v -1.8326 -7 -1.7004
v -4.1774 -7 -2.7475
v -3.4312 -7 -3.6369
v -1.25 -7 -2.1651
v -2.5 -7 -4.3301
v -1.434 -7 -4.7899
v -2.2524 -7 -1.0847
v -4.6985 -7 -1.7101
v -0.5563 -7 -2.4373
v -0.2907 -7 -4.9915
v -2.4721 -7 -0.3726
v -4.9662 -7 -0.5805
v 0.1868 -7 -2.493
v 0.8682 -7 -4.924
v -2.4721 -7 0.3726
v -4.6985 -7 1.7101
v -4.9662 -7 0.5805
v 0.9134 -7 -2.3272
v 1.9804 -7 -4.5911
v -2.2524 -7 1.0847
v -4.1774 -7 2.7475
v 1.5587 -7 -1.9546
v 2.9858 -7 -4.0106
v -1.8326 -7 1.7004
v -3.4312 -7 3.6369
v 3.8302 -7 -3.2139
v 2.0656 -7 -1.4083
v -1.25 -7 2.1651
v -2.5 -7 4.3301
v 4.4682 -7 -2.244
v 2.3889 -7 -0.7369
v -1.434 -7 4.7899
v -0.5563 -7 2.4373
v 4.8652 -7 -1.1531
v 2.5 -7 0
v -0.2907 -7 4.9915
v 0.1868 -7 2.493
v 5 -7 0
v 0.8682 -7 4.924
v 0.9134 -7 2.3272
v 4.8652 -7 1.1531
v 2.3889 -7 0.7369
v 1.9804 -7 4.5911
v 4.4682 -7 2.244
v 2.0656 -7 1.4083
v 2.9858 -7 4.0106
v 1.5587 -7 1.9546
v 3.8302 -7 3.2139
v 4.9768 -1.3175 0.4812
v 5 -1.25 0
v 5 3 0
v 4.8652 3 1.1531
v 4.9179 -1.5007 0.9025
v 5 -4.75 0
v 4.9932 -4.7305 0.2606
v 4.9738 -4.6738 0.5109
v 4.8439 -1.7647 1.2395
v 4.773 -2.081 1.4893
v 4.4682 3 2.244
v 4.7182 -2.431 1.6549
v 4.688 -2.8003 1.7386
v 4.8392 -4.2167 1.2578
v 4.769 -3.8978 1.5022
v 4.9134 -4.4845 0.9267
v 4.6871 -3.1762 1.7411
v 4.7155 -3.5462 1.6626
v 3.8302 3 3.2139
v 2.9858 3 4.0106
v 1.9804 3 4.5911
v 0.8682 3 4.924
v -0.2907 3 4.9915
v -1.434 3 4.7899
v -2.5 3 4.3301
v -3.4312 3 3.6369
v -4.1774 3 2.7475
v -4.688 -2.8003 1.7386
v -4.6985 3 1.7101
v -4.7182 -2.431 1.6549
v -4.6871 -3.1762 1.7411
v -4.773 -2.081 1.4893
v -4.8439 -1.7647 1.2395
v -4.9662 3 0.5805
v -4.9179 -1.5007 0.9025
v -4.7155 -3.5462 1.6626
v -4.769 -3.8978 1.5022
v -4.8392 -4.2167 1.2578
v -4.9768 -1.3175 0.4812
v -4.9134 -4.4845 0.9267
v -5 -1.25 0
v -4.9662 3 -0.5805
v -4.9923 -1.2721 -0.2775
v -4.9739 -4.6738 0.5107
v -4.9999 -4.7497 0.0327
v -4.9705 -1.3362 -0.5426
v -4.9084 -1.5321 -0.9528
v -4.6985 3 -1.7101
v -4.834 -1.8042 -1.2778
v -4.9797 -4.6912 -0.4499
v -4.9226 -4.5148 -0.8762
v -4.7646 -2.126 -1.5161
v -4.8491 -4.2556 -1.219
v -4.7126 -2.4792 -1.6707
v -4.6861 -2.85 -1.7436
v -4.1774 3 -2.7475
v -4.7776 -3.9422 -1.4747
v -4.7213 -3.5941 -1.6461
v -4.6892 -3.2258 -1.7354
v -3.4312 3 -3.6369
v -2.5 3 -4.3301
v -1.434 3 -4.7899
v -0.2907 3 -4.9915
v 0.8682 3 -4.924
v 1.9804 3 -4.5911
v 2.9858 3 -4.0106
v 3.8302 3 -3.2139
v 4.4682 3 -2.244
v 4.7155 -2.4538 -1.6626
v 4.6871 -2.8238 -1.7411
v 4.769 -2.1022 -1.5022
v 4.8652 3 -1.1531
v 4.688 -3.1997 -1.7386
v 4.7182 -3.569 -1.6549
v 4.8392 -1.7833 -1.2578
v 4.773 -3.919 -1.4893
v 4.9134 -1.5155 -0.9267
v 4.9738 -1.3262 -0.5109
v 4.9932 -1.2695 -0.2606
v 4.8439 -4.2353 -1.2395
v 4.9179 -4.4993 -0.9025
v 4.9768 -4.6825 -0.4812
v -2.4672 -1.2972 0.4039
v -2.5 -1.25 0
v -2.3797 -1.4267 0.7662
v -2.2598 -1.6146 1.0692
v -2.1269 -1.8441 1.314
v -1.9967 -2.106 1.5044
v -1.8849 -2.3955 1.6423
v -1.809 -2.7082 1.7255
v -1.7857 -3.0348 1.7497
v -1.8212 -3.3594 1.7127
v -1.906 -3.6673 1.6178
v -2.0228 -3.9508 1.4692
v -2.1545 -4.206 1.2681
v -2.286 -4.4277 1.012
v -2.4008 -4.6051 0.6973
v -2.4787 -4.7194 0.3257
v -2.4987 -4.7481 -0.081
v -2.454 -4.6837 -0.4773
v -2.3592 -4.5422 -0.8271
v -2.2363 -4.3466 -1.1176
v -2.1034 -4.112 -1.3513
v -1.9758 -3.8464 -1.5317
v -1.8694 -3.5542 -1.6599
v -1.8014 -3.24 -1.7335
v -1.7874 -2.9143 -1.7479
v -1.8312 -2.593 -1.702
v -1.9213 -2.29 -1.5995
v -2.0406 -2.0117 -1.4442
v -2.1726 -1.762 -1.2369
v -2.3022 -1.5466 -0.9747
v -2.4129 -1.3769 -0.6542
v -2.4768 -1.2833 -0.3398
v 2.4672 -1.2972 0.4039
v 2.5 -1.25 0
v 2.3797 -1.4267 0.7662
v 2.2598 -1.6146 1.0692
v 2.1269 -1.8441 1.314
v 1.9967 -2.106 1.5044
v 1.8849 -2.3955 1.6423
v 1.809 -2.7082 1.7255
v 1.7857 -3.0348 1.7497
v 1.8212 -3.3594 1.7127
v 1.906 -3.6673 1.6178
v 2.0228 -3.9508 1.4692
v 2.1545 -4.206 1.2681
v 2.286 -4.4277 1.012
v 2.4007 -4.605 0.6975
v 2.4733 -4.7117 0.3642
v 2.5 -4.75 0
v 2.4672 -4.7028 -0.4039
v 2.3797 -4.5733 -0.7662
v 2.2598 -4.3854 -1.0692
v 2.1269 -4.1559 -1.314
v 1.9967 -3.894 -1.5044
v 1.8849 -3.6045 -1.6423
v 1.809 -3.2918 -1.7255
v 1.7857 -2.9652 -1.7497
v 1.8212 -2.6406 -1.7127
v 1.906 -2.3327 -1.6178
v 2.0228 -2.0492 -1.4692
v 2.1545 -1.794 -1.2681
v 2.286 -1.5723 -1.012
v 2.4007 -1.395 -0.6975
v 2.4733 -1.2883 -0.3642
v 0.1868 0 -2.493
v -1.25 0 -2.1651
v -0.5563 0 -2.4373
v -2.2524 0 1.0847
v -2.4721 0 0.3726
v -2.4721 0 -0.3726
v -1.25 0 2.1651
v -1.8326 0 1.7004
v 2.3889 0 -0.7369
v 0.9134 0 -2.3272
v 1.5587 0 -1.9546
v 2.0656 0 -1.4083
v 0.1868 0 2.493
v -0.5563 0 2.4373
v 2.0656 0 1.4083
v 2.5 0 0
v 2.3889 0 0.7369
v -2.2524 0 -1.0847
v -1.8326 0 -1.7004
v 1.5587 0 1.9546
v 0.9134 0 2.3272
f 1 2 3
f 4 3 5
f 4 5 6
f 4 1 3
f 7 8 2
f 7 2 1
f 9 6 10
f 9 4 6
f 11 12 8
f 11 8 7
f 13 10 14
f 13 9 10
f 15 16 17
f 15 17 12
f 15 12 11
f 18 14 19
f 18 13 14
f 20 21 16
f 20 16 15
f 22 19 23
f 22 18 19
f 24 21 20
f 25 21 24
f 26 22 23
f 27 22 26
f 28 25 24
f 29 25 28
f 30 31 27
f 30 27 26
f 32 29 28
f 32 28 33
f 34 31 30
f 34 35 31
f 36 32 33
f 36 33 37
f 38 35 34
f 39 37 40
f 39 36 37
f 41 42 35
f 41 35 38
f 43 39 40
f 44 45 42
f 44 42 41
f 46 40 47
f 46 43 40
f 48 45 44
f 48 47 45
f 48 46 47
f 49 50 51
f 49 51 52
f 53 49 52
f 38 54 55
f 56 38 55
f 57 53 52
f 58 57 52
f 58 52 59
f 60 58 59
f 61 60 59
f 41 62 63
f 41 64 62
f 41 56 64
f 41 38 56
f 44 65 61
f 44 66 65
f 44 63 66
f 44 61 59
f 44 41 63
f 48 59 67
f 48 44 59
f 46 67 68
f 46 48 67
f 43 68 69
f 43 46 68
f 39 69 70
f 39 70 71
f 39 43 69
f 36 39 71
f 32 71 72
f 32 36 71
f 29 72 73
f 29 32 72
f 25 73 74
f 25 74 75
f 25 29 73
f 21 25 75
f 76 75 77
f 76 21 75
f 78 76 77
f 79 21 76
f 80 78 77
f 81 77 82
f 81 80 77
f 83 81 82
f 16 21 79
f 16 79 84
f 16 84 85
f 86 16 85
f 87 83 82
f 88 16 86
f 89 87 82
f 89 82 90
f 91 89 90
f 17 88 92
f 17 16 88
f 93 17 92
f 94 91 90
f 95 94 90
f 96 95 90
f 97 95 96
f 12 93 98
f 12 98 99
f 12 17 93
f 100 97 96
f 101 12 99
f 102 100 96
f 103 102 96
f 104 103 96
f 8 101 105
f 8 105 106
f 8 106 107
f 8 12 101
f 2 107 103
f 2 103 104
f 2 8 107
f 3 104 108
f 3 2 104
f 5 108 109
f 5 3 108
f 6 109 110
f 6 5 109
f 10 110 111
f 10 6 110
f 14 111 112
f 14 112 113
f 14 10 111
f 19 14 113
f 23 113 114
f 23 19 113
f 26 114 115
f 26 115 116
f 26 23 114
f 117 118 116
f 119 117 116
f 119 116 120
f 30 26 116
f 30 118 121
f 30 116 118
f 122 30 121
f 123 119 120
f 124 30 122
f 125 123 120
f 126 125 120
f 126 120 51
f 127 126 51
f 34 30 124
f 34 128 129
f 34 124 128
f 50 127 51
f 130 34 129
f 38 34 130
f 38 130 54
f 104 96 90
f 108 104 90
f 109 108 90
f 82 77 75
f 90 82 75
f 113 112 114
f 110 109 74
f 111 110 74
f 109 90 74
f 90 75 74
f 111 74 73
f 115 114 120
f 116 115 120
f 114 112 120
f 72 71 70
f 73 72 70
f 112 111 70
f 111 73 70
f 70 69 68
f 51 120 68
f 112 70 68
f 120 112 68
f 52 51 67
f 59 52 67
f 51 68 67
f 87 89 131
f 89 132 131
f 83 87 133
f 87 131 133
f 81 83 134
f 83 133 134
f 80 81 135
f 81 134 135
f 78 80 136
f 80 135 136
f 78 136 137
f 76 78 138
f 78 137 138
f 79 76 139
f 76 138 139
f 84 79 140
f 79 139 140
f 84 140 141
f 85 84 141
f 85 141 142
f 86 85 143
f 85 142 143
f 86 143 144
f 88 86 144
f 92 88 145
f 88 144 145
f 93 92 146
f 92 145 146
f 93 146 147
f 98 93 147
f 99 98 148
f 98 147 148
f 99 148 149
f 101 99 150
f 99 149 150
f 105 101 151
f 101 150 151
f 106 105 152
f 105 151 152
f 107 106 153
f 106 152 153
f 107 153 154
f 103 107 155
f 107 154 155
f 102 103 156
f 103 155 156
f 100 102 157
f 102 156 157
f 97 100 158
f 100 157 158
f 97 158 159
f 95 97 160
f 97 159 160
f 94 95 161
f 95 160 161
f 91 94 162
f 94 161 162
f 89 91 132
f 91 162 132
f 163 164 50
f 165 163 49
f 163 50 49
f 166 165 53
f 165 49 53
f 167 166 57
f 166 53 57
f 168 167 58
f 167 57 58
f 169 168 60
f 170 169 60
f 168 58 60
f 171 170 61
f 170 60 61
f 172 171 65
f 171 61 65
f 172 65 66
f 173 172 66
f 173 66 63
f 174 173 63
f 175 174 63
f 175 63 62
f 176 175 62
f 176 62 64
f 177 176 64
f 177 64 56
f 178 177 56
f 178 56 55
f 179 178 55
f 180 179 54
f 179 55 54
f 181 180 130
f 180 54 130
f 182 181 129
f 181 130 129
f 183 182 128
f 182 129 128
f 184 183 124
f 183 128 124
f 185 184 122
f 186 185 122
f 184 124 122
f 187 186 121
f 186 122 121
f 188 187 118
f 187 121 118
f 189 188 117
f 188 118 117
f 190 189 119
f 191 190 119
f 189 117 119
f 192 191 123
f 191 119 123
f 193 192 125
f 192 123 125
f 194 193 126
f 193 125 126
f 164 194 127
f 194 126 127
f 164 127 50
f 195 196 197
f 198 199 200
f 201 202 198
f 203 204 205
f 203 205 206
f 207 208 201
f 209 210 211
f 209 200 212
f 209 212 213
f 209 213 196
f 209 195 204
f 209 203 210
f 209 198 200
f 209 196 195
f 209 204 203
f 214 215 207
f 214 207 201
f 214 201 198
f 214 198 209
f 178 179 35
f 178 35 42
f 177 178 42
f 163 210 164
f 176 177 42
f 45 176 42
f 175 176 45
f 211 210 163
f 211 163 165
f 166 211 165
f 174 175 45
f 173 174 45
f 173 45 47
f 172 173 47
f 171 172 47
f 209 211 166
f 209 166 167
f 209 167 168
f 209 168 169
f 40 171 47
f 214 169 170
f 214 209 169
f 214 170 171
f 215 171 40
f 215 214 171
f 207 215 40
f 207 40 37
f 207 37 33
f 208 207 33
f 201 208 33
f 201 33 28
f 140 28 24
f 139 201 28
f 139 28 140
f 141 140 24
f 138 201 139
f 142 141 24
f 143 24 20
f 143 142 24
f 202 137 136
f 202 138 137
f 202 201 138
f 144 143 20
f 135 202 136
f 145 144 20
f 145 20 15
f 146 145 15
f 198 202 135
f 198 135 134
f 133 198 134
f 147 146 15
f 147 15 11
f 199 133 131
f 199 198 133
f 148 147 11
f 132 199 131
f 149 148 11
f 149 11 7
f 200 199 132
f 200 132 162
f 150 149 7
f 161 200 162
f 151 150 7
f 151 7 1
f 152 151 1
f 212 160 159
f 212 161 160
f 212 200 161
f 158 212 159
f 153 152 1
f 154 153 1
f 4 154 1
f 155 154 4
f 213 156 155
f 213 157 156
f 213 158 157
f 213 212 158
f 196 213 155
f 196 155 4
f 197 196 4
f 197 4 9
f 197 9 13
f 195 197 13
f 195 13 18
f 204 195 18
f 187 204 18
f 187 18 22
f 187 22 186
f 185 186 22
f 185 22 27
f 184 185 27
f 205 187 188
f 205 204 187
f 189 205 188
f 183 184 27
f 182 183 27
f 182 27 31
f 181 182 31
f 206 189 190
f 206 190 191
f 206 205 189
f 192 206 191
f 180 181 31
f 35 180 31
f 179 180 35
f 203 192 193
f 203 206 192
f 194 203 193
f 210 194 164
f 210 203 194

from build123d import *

# Parameters (mm, degrees)
F0_R     = 5
F0_R_2   = 2.5
F1_DEPTH = 7
F2_R     = 5
F3_DEPTH = 3
F4_R     = 1.75
F5_DEPTH = 12.5


with BuildPart() as f1:
    # F0 (on Front) → F1 (new body)
    with BuildSketch(Plane.XZ):
        Circle(F0_R)
        Circle(F0_R_2, mode=Mode.SUBTRACT)
    extrude(amount=F1_DEPTH)

    # F2 (on Front) → F3 (join)
    with BuildSketch(Plane.XZ):
        Circle(F2_R)
    extrude(amount=-F3_DEPTH)

    # F4 (on Right) → F5 (cut, symmetric)
    with BuildSketch(Plane.YZ):
        with Locations((-3, 0)):
            Circle(F4_R)
    extrude(amount=F5_DEPTH, both=True, mode=Mode.SUBTRACT)


solid = f1.part
